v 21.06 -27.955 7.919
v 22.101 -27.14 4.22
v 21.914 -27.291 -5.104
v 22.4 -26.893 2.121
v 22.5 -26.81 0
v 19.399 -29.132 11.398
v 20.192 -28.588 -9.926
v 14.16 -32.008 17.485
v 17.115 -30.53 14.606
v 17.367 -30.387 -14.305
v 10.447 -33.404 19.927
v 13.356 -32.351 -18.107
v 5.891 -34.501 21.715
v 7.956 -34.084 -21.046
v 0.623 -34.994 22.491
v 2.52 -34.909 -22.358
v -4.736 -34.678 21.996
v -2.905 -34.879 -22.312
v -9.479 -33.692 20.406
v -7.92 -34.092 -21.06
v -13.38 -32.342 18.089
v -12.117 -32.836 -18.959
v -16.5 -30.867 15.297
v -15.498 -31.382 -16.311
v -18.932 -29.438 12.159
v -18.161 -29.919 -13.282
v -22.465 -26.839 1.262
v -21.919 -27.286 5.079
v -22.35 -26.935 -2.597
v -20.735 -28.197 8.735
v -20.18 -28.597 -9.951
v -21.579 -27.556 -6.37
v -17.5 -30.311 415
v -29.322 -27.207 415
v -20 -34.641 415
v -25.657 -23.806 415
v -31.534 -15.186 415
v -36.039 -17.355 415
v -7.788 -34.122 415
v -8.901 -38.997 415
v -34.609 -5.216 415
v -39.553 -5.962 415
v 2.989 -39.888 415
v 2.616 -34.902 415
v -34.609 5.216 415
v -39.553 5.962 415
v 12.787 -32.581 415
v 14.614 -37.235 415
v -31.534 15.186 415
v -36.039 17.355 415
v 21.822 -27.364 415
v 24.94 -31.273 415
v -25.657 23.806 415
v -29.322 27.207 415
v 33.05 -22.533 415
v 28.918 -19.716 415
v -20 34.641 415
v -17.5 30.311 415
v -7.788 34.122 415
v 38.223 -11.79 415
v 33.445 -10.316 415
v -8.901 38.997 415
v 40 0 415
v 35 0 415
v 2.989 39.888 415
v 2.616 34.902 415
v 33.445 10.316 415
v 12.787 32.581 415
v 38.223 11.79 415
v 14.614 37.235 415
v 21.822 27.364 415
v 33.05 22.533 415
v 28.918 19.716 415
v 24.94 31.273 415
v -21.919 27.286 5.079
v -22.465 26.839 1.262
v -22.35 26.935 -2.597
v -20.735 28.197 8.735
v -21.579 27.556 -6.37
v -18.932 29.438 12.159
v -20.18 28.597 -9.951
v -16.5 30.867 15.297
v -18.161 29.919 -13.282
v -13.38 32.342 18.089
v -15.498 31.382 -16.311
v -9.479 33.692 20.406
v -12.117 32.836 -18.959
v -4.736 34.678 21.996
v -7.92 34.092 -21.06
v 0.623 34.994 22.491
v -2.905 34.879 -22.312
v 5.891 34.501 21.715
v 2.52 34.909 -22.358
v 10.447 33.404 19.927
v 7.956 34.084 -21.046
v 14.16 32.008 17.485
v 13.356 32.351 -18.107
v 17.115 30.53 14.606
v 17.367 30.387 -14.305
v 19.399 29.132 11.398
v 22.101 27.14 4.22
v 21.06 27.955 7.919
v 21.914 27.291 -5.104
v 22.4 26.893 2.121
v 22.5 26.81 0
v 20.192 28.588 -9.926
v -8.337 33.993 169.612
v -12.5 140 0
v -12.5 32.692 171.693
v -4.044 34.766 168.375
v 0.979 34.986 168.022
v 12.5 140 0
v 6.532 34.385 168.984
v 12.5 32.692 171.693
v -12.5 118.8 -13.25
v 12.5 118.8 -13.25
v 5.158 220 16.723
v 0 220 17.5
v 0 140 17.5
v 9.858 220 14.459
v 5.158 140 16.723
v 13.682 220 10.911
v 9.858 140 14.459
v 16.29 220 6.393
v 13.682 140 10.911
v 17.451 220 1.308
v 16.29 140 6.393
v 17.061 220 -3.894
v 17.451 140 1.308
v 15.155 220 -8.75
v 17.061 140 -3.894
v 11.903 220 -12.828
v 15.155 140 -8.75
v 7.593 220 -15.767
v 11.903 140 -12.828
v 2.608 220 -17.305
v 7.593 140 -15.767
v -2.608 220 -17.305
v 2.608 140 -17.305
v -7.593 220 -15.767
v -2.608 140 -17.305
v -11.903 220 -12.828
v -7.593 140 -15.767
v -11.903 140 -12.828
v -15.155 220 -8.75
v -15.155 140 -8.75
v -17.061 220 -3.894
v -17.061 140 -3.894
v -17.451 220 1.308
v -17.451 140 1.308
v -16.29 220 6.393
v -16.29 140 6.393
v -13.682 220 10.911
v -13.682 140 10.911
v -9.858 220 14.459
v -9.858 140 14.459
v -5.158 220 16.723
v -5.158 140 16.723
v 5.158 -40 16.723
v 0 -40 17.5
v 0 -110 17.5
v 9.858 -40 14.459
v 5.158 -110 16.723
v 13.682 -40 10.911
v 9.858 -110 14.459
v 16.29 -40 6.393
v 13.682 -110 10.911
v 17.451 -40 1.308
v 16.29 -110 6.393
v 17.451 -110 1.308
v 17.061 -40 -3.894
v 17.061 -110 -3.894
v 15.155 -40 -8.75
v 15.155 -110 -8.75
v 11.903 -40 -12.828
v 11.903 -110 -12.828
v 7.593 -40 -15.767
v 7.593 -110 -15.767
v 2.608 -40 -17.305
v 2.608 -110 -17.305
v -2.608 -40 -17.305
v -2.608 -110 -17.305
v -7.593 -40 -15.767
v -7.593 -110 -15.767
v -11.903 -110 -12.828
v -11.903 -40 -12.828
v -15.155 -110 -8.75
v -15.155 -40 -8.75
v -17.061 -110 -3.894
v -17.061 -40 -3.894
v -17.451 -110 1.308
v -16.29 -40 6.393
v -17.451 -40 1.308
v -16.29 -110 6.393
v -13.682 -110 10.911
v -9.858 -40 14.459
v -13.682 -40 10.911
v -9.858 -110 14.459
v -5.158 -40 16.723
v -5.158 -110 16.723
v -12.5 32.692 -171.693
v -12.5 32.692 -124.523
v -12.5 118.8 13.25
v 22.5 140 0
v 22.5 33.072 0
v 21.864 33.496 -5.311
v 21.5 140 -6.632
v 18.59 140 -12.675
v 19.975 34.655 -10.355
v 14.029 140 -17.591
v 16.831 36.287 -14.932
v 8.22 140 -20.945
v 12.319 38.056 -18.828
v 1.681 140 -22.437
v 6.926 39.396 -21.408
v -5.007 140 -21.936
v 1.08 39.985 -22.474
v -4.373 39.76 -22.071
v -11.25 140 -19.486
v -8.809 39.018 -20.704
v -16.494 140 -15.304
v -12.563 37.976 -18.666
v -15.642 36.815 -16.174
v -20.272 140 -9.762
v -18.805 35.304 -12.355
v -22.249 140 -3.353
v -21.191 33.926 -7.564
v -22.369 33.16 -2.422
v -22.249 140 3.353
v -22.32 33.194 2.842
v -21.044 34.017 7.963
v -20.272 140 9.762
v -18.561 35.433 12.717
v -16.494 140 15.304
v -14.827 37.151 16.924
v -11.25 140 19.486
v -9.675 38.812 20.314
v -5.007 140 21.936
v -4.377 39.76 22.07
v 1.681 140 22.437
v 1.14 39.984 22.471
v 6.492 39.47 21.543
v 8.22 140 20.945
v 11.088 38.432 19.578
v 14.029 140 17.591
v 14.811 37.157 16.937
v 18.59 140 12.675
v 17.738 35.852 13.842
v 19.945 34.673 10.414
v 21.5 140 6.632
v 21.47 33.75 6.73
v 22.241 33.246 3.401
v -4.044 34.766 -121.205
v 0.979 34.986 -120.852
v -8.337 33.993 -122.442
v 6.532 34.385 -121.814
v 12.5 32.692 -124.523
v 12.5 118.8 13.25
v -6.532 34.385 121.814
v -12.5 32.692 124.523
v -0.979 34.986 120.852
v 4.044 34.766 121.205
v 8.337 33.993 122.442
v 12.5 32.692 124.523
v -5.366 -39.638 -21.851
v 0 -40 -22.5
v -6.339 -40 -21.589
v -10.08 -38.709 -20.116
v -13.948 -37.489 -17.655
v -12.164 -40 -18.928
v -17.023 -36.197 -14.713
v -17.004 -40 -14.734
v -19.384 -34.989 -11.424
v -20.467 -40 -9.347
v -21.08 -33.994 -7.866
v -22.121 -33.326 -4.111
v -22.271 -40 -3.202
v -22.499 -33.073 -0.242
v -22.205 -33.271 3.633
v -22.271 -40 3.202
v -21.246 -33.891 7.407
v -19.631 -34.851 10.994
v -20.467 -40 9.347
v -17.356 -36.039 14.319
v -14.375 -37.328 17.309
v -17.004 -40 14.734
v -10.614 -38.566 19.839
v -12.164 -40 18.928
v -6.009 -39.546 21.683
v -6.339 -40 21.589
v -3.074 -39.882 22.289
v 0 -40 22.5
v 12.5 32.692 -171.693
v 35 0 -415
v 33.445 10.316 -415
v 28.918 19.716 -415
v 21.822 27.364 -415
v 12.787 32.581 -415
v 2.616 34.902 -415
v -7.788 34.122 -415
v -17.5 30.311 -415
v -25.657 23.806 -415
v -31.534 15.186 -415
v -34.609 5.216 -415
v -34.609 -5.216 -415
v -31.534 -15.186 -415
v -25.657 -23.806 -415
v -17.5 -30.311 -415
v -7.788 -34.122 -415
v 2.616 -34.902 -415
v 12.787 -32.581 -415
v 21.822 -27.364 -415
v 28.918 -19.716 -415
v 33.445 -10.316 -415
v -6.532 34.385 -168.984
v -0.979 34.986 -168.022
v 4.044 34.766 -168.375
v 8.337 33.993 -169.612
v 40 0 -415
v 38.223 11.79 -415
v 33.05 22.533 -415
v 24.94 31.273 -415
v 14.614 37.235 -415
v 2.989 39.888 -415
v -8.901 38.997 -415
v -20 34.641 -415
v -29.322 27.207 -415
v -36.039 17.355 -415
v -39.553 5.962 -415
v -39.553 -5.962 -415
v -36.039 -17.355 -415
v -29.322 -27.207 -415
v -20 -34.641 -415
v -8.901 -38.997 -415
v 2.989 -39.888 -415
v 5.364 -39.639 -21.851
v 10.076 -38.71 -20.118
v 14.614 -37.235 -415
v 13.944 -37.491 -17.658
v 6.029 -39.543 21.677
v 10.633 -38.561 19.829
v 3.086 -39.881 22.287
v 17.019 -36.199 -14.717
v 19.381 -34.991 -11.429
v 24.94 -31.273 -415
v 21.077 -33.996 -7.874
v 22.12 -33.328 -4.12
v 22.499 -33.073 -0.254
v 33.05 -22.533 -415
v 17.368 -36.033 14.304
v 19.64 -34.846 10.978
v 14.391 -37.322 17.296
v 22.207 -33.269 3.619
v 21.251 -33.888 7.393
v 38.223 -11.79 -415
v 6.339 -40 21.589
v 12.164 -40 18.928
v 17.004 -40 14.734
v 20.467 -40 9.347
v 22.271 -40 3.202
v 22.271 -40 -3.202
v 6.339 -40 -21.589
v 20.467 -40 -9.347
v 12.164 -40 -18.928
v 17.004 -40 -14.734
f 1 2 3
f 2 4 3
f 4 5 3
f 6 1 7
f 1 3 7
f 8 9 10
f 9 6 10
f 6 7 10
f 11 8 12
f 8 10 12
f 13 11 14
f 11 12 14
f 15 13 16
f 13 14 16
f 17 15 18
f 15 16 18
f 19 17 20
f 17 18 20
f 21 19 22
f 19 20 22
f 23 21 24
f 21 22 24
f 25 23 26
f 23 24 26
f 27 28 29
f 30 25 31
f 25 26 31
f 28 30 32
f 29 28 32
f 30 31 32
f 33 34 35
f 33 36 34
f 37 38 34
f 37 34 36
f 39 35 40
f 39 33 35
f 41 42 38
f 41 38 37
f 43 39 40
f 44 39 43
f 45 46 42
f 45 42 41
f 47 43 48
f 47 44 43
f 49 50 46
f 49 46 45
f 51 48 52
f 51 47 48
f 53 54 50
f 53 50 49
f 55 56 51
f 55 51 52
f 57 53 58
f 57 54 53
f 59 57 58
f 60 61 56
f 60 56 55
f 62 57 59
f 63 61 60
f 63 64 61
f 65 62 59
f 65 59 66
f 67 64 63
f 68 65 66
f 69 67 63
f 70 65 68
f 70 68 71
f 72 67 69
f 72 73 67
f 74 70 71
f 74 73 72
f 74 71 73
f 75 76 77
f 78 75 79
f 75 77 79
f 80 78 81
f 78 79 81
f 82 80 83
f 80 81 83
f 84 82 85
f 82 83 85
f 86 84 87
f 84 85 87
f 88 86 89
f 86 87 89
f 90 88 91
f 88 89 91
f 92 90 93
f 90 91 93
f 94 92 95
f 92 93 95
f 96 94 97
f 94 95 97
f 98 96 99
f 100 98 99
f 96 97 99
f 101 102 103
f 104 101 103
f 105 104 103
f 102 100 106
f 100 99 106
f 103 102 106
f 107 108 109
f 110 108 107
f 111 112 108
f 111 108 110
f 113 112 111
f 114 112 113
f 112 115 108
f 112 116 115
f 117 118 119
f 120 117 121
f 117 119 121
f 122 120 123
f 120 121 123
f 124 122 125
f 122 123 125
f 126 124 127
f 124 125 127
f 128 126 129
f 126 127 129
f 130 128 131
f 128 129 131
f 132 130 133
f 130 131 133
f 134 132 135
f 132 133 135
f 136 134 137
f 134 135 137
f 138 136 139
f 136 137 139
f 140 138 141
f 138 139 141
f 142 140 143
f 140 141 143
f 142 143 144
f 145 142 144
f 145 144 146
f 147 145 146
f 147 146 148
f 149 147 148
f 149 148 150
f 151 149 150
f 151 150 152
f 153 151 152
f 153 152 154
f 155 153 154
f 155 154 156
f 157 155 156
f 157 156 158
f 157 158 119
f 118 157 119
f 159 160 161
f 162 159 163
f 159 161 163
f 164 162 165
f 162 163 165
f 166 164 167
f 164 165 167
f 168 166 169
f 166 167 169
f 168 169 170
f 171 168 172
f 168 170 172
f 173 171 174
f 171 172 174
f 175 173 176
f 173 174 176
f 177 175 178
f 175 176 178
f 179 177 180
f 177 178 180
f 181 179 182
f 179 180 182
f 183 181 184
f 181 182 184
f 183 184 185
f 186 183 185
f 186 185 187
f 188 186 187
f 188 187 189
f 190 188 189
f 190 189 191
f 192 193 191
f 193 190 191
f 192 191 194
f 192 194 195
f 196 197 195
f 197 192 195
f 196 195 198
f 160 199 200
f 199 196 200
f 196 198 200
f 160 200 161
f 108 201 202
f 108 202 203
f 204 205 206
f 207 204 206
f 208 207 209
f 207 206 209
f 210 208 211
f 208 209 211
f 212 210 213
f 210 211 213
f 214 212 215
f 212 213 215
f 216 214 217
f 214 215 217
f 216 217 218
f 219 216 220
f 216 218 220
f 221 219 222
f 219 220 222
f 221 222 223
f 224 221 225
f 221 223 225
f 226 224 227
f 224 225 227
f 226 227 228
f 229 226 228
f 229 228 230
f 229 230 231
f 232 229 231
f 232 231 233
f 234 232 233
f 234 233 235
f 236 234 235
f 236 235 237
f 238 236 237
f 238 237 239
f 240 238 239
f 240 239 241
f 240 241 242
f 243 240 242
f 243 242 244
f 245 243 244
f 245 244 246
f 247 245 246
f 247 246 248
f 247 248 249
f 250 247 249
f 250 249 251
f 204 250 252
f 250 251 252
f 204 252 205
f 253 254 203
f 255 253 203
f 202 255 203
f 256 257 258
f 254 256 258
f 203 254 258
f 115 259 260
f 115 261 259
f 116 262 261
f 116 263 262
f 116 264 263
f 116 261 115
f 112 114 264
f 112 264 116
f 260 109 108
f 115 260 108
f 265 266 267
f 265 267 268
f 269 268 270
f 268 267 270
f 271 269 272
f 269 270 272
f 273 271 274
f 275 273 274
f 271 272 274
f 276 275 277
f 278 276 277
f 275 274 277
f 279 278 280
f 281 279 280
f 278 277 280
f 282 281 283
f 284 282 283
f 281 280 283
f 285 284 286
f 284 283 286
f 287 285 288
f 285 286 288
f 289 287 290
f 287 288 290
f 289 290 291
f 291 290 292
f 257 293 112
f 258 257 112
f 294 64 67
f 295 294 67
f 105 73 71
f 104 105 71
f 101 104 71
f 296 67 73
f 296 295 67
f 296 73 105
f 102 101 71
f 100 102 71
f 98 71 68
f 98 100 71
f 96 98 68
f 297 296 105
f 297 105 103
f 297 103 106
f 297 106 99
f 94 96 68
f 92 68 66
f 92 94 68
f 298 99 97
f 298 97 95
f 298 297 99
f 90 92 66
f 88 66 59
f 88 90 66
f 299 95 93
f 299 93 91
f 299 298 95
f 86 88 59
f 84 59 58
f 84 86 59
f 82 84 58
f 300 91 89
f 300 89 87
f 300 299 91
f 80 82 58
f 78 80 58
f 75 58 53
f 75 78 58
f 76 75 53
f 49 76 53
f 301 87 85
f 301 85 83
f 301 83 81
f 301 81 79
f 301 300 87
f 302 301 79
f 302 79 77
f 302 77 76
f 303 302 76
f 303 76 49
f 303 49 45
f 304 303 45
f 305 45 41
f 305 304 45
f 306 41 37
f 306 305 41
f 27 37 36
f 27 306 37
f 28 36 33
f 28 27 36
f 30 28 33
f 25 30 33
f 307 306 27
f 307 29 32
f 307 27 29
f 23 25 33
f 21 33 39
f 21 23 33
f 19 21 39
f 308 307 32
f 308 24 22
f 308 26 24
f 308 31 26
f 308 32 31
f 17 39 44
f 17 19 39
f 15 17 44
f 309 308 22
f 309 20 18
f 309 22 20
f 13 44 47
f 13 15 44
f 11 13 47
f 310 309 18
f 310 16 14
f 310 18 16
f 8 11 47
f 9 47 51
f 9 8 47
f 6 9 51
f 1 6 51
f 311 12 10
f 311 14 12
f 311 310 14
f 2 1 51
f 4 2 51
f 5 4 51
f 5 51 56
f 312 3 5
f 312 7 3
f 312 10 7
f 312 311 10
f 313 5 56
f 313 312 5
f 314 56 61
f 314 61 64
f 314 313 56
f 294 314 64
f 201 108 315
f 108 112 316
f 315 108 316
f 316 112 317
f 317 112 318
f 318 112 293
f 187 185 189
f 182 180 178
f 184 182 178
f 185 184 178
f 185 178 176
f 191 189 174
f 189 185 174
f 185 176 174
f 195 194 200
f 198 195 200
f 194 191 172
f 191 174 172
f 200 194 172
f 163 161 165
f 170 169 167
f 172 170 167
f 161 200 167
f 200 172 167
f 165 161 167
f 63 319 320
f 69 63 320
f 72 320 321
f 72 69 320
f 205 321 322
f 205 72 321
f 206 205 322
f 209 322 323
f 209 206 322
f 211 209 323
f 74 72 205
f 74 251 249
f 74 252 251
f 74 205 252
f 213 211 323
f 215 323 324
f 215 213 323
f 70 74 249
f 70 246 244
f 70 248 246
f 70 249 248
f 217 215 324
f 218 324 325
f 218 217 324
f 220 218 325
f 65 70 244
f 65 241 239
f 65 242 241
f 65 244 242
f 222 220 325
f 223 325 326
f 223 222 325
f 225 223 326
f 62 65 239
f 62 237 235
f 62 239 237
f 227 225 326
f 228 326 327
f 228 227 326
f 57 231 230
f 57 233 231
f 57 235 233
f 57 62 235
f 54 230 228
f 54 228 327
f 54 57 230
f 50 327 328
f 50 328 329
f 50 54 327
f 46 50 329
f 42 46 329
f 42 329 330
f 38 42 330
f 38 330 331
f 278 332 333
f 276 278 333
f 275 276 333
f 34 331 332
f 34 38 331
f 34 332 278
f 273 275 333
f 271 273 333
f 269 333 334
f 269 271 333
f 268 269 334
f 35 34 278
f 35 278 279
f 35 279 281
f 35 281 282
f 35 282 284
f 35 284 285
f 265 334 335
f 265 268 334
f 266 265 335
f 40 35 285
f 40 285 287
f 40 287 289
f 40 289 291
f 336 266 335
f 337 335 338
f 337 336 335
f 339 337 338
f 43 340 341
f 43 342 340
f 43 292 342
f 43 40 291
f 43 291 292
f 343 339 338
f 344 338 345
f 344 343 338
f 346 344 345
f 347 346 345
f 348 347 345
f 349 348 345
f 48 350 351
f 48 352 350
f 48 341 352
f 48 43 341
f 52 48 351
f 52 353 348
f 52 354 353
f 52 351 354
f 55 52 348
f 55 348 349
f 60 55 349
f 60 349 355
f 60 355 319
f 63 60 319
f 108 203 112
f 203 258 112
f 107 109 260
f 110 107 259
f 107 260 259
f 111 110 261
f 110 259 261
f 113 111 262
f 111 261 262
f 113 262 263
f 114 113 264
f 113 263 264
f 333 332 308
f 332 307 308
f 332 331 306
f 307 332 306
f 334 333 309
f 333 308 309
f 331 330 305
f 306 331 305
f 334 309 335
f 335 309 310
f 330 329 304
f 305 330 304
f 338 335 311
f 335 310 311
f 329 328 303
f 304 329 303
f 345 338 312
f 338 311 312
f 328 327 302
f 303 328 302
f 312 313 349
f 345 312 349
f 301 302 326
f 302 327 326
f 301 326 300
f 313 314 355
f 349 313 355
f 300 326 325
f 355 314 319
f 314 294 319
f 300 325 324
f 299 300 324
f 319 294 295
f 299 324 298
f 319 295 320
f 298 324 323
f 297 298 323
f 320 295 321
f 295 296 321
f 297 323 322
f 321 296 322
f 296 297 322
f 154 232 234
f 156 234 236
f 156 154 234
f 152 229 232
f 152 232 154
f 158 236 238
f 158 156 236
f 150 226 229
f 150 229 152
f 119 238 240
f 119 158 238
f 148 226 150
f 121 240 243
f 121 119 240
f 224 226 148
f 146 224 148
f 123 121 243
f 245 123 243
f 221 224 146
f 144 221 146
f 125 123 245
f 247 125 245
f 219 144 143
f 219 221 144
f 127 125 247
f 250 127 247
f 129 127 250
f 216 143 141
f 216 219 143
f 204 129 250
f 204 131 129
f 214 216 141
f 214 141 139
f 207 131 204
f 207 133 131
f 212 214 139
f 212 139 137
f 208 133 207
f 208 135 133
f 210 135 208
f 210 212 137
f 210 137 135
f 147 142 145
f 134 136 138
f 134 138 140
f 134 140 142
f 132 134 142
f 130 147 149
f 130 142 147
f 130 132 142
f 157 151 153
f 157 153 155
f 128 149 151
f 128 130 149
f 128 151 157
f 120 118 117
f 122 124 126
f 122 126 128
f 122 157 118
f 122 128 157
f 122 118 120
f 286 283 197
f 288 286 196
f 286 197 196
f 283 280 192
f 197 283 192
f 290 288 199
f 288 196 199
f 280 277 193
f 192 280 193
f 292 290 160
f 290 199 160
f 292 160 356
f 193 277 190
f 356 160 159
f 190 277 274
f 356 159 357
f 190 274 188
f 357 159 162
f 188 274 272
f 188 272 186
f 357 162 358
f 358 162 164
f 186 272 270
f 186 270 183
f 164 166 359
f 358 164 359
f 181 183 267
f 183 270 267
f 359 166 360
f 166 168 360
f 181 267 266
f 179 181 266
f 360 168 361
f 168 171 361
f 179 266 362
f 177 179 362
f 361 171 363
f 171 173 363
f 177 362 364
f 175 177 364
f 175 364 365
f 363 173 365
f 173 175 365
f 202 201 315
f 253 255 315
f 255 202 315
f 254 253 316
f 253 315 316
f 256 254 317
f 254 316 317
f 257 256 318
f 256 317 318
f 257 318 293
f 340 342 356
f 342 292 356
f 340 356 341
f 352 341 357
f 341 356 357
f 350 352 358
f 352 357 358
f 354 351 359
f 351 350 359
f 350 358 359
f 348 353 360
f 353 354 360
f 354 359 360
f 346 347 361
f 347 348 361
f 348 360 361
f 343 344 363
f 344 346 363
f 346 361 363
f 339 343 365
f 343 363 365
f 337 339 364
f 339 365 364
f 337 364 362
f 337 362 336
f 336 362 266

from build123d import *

# Parameters (mm, degrees)
SKETCH1_R                = 40
SKETCH1_R_2              = 35
EXTRUDE_THIN1_DEPTH      = 415
EXTRUDE_THIN2_DEPTH      = 140
EXTRUDE_THIN2_DEPTH_BACK = 40
SKETCH2_R                = 22.5
SKETCH2_R_2              = 17.5
BOSS_EXTRUDE1_DEPTH      = 80
BOSS_EXTRUDE1_DEPTH_BACK = 250
SKETCH3_R                = 17.5
EXTRUDE_THIN3_DEPTH      = 12.5
SKETCH5_R                = 35
CUT_EXTRUDE1_DEPTH       = 846


with BuildPart() as part:
    # Sketch1 → Extrude-Thin1 (new, symmetric)
    with BuildSketch(Plane.XY):
        Circle(SKETCH1_R)
        Circle(SKETCH1_R_2, mode=Mode.SUBTRACT)
    extrude(amount=EXTRUDE_THIN1_DEPTH, both=True)

    # Sketch2 → Extrude-Thin2 (add, two sides: drawn at the far end of the back side and taken through both)
    with BuildSketch(Plane(origin=(0, 0, 0), x_dir=(1, 0, 0), z_dir=(0, 1, 0)).offset(-EXTRUDE_THIN2_DEPTH_BACK)):
        Circle(SKETCH2_R)
        Circle(SKETCH2_R_2, mode=Mode.SUBTRACT)
    extrude(amount=EXTRUDE_THIN2_DEPTH + EXTRUDE_THIN2_DEPTH_BACK)

    # Sketch3 → Boss-Extrude1 (add, two sides: drawn at the far end of the back side and taken through both)
    with BuildSketch(Plane(origin=(0, 140, 0), x_dir=(1, 0, 0), z_dir=(0, 1, 0)).offset(-BOSS_EXTRUDE1_DEPTH_BACK)):
        with Locations(Location((0, 0, 0), (0, 0, 270))):
            Circle(SKETCH3_R)
    extrude(amount=BOSS_EXTRUDE1_DEPTH + BOSS_EXTRUDE1_DEPTH_BACK)


with BuildPart() as body_2:
    # Sketch4 → Extrude-Thin3 (new, symmetric)
    with BuildSketch(Plane(origin=(0, 0, 0), x_dir=(0, 0, -1), z_dir=(1, 0, 0))):
        Polygon((0, 140), (-200, 15), (-186.7500265, -6.1999576), (13.2499735, 118.8000424), align=None)
    extrude(amount=EXTRUDE_THIN3_DEPTH, both=True)


with BuildPart() as body_3:
    # Mirror1: mirrored copy
    add(body_2.part.mirror(Plane.XY))


with BuildPart() as cut_extrude1_tool:
    # Sketch5 → Cut-Extrude1 (new body)
    with BuildSketch(Plane(origin=(0, 0, -415), x_dir=(-1, 0, 0), z_dir=(0, 0, -1))):
        with Locations(Location((0, 0, 0), (0, 0, 180))):
            Circle(SKETCH5_R)
    extrude(amount=-CUT_EXTRUDE1_DEPTH)


with BuildPart() as part_1:
    add(part.part)

    # Cut-Extrude1: cut by cut_extrude1_tool
    add(cut_extrude1_tool.part, mode=Mode.SUBTRACT)


with BuildPart() as body_2_1:
    add(body_2.part)

    # Cut-Extrude1: cut by cut_extrude1_tool
    add(cut_extrude1_tool.part, mode=Mode.SUBTRACT)


with BuildPart() as body_3_1:
    add(body_3.part)

    # Cut-Extrude1: cut by cut_extrude1_tool
    add(cut_extrude1_tool.part, mode=Mode.SUBTRACT)


solid = Compound([part_1.part, body_2_1.part, body_3_1.part])
